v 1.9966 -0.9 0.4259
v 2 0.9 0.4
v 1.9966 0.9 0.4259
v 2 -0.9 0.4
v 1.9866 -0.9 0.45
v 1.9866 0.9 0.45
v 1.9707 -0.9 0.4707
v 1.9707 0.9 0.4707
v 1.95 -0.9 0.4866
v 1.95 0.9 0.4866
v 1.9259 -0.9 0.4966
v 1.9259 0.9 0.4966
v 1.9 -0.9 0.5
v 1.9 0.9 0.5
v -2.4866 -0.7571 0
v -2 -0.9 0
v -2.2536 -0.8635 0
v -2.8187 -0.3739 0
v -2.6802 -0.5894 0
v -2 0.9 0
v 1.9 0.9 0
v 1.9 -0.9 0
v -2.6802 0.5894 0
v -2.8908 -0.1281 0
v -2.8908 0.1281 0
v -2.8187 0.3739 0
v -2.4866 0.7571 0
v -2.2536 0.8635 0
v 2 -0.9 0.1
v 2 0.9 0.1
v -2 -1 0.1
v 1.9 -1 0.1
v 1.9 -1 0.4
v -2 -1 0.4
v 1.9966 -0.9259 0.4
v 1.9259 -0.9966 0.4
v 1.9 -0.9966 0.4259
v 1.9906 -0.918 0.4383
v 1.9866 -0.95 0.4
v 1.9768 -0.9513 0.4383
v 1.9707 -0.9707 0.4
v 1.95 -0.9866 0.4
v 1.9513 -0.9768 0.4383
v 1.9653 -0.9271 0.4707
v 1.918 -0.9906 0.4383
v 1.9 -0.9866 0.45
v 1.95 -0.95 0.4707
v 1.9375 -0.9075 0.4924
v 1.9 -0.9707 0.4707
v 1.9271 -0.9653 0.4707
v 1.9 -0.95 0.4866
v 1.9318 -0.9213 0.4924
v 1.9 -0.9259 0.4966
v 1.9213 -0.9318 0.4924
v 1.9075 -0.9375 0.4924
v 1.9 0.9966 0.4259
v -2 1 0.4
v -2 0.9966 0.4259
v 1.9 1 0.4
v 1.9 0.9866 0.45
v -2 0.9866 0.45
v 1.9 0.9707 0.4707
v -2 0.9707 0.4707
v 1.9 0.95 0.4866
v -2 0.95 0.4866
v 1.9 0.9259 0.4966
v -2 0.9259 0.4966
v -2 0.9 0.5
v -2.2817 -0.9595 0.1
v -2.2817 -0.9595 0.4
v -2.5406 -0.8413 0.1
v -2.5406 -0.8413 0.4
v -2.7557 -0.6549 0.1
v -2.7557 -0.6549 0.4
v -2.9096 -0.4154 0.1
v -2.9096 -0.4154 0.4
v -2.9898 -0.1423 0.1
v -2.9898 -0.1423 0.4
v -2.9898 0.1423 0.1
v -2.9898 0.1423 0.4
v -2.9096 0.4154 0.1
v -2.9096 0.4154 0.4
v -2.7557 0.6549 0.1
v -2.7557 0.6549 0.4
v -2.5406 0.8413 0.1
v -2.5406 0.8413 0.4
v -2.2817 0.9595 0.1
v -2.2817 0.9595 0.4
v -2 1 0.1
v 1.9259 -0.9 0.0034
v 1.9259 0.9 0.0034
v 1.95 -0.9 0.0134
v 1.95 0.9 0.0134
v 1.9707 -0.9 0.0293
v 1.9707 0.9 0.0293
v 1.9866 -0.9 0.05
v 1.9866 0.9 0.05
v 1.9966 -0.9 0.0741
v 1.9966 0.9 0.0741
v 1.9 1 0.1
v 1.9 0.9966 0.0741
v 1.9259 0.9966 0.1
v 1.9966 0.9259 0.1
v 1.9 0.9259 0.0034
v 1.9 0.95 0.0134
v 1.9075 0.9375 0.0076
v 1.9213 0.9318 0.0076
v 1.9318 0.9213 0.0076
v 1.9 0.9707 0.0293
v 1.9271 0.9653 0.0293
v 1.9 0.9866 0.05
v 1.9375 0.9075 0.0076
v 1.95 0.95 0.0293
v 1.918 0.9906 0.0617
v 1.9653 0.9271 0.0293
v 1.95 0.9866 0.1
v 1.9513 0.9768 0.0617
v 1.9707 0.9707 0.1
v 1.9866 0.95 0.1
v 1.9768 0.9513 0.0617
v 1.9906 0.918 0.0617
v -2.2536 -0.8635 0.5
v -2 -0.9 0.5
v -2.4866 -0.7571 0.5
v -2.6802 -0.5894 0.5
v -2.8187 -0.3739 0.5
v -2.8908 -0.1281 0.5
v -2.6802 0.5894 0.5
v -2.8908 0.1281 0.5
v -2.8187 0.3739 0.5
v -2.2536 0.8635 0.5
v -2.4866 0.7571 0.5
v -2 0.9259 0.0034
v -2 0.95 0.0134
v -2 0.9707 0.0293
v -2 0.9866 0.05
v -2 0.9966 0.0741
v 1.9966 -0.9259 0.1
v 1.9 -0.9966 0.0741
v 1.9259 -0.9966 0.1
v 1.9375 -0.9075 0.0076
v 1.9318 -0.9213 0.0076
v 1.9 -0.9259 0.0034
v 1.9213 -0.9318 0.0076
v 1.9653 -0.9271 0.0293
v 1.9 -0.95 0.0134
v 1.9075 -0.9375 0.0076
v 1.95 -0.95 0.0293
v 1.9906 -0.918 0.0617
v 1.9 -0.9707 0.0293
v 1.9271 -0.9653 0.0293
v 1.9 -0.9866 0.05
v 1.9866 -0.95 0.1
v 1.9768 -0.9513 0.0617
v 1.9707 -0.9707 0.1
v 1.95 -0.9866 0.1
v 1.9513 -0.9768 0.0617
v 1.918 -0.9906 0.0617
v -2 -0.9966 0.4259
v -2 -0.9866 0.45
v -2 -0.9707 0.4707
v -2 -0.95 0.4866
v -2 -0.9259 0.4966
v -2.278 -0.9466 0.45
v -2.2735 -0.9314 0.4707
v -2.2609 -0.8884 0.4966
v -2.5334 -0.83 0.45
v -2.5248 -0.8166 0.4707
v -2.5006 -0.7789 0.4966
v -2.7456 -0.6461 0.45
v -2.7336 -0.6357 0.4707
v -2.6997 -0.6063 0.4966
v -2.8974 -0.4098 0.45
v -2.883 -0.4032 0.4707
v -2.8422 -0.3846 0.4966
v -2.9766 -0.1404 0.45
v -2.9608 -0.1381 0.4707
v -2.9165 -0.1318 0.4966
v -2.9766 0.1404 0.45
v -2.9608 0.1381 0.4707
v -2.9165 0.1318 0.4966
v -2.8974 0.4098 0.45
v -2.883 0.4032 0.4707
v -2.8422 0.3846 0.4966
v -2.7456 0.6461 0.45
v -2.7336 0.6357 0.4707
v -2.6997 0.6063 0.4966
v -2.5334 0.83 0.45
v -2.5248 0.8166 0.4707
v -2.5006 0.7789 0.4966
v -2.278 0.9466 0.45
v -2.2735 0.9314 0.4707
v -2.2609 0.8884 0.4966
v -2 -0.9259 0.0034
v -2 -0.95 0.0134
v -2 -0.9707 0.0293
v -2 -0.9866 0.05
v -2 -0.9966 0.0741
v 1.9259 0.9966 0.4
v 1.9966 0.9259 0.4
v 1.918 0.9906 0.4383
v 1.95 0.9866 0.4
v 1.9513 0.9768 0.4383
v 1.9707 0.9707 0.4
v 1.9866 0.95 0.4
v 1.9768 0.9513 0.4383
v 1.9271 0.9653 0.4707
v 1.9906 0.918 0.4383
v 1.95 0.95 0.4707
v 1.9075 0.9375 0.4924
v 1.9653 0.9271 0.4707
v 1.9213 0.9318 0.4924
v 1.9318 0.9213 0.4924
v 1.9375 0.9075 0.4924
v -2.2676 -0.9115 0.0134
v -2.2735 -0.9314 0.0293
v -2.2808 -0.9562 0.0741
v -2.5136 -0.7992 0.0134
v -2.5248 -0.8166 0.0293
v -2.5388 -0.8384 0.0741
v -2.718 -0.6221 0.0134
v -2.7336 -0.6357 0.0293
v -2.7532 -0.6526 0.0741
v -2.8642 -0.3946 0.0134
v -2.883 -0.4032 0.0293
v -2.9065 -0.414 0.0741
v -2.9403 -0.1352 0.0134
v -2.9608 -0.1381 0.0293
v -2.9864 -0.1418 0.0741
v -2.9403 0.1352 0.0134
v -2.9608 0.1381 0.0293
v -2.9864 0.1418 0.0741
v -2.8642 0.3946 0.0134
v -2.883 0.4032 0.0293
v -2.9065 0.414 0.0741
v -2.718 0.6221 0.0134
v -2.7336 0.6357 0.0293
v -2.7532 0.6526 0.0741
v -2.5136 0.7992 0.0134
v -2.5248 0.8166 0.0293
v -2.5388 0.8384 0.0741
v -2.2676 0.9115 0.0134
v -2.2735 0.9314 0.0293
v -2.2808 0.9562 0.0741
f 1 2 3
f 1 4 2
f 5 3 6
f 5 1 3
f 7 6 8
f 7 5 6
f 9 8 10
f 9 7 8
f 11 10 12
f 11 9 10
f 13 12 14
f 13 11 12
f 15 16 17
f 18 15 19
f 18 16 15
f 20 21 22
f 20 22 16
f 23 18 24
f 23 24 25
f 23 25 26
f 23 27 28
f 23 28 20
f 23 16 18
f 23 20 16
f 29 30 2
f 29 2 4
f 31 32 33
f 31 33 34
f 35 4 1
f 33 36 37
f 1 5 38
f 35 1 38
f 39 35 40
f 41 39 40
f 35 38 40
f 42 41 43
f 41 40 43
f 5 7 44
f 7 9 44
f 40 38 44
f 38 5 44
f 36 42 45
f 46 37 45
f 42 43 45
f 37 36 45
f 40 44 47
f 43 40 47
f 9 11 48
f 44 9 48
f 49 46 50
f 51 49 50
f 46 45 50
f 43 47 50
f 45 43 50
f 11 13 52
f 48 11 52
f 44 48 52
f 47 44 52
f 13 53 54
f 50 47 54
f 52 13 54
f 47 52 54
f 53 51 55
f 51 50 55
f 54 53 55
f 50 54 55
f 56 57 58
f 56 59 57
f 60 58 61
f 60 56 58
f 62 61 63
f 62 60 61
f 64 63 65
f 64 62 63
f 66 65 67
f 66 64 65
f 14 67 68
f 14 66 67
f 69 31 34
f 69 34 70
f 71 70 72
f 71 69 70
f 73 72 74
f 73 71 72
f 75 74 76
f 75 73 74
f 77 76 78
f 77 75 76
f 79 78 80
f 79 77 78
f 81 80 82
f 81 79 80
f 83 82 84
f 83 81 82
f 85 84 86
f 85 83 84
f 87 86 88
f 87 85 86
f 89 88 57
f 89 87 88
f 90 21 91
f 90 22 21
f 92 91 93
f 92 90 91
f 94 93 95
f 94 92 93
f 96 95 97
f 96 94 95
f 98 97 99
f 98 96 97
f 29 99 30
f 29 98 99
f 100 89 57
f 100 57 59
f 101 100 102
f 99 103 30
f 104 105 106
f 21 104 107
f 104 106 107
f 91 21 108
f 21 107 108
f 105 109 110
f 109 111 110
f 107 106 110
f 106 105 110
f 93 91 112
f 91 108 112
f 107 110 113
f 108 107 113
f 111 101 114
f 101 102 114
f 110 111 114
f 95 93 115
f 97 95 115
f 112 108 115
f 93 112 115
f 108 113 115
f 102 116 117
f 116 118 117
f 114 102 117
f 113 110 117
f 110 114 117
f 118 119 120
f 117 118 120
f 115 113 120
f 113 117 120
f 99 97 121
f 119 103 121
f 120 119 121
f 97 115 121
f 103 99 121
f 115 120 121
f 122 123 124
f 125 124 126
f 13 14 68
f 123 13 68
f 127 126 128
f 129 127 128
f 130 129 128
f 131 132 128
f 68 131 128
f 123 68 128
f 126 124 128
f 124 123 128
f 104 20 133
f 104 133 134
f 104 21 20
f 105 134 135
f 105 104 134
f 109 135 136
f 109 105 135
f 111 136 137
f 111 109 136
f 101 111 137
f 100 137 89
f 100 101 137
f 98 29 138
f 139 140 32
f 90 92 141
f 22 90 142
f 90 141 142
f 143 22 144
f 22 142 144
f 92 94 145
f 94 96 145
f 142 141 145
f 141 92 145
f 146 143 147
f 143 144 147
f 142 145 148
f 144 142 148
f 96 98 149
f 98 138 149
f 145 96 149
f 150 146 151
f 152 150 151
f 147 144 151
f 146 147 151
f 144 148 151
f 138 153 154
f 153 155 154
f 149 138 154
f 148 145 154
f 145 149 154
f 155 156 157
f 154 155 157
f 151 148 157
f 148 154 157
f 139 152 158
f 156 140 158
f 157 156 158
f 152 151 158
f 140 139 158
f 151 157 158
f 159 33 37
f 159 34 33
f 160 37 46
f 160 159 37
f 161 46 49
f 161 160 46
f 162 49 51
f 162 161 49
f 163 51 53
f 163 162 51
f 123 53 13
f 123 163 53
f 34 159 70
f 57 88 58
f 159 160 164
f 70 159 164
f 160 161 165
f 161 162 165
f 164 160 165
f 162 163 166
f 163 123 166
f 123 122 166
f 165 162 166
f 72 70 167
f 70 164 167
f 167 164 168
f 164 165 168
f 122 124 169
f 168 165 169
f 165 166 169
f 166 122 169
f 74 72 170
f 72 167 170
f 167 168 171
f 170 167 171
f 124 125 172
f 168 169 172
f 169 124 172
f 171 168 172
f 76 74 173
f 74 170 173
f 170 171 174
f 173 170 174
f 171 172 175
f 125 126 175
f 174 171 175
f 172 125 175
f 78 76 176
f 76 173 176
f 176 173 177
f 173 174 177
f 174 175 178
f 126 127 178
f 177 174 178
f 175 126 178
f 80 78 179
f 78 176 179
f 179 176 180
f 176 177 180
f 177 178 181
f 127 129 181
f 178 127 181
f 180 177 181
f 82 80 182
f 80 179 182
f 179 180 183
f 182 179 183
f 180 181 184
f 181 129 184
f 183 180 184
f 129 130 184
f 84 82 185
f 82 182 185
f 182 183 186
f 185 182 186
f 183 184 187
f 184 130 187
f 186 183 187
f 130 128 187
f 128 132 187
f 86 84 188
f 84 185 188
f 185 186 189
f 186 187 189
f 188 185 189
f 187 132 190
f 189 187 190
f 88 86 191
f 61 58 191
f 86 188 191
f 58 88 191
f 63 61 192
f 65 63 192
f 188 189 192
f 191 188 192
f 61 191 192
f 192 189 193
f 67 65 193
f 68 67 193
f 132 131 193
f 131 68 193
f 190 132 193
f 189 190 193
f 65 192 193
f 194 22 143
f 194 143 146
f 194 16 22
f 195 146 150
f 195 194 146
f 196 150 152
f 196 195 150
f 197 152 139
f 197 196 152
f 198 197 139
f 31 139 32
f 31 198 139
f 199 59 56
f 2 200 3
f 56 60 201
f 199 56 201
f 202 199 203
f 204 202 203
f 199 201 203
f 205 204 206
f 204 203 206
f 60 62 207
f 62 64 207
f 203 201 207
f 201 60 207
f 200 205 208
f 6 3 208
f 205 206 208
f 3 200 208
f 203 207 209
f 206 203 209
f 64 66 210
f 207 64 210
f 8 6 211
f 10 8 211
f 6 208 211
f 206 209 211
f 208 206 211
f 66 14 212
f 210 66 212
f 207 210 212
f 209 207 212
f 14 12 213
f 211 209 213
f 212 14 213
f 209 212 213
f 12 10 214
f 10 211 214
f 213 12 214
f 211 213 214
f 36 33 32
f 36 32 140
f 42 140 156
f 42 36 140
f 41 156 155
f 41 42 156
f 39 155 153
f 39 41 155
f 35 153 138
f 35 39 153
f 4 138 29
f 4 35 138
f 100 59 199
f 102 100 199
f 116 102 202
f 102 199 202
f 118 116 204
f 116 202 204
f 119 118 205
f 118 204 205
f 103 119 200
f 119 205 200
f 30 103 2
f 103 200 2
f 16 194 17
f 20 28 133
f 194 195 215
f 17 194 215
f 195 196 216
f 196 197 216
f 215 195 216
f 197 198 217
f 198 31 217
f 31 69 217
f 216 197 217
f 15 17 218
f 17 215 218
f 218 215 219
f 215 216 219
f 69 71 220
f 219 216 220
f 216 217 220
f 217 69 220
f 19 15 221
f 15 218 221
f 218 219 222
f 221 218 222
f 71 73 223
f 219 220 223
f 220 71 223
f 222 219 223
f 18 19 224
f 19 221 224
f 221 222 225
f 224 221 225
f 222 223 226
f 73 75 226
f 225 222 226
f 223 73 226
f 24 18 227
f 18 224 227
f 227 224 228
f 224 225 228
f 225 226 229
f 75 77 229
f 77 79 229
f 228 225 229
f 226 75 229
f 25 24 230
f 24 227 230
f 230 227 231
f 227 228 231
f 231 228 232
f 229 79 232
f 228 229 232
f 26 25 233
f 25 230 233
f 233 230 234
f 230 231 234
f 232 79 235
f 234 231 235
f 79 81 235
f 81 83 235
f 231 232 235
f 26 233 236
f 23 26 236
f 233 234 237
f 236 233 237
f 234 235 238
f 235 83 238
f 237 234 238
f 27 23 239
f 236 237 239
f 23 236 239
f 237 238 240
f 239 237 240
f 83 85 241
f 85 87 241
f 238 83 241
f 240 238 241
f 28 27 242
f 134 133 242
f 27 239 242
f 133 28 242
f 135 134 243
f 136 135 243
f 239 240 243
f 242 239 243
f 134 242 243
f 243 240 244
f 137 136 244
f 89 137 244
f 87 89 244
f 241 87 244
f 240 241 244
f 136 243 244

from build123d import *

# Parameters (mm, degrees)
EXTRUDE_1_DEPTH = 0.5
FILLET_2_R      = 0.1
FILLET_1_R      = 0.1


with BuildPart() as part:
    # Эскиз1 → Бобышка-Вытянуть1 (new body)
    with BuildSketch(Plane.XY):
        with BuildLine():
            Line((2, -1), (-2, -1))
            ThreePointArc((-2, -1), (-3, 0), (-2, 1))
            Line((-2, 1), (2, 1))
            Line((2, 1), (2, -1))
        make_face()
    extrude(amount=EXTRUDE_1_DEPTH)

    # Скругление2
    fillet_2_edges = [part.edges().sort_by_distance(p)[0] for p in [
        (2, -1, 0.25),
        (2, 1, 0.25),
    ]]
    fillet(fillet_2_edges, radius=FILLET_2_R)

    # Скругление1
    fillet_1_edges = [part.edges().sort_by_distance(p)[0] for p in [
        (-3, 0, 0.5),
        (2, 0, 0),
        (2, 0, 0.5),
        (-0.05, -1, 0),
        (-0.05, 1, 0),
        (1.970710678, 0.970710678, 0),
        (1.970710678, -0.970710678, 0),
        (-0.05, -1, 0.5),
        (-0.05, 1, 0.5),
        (1.970710678, 0.970710678, 0.5),
        (1.970710678, -0.970710678, 0.5),
        (-3, 0, 0),
    ]]
    fillet(fillet_1_edges, radius=FILLET_1_R)


solid = part.part
